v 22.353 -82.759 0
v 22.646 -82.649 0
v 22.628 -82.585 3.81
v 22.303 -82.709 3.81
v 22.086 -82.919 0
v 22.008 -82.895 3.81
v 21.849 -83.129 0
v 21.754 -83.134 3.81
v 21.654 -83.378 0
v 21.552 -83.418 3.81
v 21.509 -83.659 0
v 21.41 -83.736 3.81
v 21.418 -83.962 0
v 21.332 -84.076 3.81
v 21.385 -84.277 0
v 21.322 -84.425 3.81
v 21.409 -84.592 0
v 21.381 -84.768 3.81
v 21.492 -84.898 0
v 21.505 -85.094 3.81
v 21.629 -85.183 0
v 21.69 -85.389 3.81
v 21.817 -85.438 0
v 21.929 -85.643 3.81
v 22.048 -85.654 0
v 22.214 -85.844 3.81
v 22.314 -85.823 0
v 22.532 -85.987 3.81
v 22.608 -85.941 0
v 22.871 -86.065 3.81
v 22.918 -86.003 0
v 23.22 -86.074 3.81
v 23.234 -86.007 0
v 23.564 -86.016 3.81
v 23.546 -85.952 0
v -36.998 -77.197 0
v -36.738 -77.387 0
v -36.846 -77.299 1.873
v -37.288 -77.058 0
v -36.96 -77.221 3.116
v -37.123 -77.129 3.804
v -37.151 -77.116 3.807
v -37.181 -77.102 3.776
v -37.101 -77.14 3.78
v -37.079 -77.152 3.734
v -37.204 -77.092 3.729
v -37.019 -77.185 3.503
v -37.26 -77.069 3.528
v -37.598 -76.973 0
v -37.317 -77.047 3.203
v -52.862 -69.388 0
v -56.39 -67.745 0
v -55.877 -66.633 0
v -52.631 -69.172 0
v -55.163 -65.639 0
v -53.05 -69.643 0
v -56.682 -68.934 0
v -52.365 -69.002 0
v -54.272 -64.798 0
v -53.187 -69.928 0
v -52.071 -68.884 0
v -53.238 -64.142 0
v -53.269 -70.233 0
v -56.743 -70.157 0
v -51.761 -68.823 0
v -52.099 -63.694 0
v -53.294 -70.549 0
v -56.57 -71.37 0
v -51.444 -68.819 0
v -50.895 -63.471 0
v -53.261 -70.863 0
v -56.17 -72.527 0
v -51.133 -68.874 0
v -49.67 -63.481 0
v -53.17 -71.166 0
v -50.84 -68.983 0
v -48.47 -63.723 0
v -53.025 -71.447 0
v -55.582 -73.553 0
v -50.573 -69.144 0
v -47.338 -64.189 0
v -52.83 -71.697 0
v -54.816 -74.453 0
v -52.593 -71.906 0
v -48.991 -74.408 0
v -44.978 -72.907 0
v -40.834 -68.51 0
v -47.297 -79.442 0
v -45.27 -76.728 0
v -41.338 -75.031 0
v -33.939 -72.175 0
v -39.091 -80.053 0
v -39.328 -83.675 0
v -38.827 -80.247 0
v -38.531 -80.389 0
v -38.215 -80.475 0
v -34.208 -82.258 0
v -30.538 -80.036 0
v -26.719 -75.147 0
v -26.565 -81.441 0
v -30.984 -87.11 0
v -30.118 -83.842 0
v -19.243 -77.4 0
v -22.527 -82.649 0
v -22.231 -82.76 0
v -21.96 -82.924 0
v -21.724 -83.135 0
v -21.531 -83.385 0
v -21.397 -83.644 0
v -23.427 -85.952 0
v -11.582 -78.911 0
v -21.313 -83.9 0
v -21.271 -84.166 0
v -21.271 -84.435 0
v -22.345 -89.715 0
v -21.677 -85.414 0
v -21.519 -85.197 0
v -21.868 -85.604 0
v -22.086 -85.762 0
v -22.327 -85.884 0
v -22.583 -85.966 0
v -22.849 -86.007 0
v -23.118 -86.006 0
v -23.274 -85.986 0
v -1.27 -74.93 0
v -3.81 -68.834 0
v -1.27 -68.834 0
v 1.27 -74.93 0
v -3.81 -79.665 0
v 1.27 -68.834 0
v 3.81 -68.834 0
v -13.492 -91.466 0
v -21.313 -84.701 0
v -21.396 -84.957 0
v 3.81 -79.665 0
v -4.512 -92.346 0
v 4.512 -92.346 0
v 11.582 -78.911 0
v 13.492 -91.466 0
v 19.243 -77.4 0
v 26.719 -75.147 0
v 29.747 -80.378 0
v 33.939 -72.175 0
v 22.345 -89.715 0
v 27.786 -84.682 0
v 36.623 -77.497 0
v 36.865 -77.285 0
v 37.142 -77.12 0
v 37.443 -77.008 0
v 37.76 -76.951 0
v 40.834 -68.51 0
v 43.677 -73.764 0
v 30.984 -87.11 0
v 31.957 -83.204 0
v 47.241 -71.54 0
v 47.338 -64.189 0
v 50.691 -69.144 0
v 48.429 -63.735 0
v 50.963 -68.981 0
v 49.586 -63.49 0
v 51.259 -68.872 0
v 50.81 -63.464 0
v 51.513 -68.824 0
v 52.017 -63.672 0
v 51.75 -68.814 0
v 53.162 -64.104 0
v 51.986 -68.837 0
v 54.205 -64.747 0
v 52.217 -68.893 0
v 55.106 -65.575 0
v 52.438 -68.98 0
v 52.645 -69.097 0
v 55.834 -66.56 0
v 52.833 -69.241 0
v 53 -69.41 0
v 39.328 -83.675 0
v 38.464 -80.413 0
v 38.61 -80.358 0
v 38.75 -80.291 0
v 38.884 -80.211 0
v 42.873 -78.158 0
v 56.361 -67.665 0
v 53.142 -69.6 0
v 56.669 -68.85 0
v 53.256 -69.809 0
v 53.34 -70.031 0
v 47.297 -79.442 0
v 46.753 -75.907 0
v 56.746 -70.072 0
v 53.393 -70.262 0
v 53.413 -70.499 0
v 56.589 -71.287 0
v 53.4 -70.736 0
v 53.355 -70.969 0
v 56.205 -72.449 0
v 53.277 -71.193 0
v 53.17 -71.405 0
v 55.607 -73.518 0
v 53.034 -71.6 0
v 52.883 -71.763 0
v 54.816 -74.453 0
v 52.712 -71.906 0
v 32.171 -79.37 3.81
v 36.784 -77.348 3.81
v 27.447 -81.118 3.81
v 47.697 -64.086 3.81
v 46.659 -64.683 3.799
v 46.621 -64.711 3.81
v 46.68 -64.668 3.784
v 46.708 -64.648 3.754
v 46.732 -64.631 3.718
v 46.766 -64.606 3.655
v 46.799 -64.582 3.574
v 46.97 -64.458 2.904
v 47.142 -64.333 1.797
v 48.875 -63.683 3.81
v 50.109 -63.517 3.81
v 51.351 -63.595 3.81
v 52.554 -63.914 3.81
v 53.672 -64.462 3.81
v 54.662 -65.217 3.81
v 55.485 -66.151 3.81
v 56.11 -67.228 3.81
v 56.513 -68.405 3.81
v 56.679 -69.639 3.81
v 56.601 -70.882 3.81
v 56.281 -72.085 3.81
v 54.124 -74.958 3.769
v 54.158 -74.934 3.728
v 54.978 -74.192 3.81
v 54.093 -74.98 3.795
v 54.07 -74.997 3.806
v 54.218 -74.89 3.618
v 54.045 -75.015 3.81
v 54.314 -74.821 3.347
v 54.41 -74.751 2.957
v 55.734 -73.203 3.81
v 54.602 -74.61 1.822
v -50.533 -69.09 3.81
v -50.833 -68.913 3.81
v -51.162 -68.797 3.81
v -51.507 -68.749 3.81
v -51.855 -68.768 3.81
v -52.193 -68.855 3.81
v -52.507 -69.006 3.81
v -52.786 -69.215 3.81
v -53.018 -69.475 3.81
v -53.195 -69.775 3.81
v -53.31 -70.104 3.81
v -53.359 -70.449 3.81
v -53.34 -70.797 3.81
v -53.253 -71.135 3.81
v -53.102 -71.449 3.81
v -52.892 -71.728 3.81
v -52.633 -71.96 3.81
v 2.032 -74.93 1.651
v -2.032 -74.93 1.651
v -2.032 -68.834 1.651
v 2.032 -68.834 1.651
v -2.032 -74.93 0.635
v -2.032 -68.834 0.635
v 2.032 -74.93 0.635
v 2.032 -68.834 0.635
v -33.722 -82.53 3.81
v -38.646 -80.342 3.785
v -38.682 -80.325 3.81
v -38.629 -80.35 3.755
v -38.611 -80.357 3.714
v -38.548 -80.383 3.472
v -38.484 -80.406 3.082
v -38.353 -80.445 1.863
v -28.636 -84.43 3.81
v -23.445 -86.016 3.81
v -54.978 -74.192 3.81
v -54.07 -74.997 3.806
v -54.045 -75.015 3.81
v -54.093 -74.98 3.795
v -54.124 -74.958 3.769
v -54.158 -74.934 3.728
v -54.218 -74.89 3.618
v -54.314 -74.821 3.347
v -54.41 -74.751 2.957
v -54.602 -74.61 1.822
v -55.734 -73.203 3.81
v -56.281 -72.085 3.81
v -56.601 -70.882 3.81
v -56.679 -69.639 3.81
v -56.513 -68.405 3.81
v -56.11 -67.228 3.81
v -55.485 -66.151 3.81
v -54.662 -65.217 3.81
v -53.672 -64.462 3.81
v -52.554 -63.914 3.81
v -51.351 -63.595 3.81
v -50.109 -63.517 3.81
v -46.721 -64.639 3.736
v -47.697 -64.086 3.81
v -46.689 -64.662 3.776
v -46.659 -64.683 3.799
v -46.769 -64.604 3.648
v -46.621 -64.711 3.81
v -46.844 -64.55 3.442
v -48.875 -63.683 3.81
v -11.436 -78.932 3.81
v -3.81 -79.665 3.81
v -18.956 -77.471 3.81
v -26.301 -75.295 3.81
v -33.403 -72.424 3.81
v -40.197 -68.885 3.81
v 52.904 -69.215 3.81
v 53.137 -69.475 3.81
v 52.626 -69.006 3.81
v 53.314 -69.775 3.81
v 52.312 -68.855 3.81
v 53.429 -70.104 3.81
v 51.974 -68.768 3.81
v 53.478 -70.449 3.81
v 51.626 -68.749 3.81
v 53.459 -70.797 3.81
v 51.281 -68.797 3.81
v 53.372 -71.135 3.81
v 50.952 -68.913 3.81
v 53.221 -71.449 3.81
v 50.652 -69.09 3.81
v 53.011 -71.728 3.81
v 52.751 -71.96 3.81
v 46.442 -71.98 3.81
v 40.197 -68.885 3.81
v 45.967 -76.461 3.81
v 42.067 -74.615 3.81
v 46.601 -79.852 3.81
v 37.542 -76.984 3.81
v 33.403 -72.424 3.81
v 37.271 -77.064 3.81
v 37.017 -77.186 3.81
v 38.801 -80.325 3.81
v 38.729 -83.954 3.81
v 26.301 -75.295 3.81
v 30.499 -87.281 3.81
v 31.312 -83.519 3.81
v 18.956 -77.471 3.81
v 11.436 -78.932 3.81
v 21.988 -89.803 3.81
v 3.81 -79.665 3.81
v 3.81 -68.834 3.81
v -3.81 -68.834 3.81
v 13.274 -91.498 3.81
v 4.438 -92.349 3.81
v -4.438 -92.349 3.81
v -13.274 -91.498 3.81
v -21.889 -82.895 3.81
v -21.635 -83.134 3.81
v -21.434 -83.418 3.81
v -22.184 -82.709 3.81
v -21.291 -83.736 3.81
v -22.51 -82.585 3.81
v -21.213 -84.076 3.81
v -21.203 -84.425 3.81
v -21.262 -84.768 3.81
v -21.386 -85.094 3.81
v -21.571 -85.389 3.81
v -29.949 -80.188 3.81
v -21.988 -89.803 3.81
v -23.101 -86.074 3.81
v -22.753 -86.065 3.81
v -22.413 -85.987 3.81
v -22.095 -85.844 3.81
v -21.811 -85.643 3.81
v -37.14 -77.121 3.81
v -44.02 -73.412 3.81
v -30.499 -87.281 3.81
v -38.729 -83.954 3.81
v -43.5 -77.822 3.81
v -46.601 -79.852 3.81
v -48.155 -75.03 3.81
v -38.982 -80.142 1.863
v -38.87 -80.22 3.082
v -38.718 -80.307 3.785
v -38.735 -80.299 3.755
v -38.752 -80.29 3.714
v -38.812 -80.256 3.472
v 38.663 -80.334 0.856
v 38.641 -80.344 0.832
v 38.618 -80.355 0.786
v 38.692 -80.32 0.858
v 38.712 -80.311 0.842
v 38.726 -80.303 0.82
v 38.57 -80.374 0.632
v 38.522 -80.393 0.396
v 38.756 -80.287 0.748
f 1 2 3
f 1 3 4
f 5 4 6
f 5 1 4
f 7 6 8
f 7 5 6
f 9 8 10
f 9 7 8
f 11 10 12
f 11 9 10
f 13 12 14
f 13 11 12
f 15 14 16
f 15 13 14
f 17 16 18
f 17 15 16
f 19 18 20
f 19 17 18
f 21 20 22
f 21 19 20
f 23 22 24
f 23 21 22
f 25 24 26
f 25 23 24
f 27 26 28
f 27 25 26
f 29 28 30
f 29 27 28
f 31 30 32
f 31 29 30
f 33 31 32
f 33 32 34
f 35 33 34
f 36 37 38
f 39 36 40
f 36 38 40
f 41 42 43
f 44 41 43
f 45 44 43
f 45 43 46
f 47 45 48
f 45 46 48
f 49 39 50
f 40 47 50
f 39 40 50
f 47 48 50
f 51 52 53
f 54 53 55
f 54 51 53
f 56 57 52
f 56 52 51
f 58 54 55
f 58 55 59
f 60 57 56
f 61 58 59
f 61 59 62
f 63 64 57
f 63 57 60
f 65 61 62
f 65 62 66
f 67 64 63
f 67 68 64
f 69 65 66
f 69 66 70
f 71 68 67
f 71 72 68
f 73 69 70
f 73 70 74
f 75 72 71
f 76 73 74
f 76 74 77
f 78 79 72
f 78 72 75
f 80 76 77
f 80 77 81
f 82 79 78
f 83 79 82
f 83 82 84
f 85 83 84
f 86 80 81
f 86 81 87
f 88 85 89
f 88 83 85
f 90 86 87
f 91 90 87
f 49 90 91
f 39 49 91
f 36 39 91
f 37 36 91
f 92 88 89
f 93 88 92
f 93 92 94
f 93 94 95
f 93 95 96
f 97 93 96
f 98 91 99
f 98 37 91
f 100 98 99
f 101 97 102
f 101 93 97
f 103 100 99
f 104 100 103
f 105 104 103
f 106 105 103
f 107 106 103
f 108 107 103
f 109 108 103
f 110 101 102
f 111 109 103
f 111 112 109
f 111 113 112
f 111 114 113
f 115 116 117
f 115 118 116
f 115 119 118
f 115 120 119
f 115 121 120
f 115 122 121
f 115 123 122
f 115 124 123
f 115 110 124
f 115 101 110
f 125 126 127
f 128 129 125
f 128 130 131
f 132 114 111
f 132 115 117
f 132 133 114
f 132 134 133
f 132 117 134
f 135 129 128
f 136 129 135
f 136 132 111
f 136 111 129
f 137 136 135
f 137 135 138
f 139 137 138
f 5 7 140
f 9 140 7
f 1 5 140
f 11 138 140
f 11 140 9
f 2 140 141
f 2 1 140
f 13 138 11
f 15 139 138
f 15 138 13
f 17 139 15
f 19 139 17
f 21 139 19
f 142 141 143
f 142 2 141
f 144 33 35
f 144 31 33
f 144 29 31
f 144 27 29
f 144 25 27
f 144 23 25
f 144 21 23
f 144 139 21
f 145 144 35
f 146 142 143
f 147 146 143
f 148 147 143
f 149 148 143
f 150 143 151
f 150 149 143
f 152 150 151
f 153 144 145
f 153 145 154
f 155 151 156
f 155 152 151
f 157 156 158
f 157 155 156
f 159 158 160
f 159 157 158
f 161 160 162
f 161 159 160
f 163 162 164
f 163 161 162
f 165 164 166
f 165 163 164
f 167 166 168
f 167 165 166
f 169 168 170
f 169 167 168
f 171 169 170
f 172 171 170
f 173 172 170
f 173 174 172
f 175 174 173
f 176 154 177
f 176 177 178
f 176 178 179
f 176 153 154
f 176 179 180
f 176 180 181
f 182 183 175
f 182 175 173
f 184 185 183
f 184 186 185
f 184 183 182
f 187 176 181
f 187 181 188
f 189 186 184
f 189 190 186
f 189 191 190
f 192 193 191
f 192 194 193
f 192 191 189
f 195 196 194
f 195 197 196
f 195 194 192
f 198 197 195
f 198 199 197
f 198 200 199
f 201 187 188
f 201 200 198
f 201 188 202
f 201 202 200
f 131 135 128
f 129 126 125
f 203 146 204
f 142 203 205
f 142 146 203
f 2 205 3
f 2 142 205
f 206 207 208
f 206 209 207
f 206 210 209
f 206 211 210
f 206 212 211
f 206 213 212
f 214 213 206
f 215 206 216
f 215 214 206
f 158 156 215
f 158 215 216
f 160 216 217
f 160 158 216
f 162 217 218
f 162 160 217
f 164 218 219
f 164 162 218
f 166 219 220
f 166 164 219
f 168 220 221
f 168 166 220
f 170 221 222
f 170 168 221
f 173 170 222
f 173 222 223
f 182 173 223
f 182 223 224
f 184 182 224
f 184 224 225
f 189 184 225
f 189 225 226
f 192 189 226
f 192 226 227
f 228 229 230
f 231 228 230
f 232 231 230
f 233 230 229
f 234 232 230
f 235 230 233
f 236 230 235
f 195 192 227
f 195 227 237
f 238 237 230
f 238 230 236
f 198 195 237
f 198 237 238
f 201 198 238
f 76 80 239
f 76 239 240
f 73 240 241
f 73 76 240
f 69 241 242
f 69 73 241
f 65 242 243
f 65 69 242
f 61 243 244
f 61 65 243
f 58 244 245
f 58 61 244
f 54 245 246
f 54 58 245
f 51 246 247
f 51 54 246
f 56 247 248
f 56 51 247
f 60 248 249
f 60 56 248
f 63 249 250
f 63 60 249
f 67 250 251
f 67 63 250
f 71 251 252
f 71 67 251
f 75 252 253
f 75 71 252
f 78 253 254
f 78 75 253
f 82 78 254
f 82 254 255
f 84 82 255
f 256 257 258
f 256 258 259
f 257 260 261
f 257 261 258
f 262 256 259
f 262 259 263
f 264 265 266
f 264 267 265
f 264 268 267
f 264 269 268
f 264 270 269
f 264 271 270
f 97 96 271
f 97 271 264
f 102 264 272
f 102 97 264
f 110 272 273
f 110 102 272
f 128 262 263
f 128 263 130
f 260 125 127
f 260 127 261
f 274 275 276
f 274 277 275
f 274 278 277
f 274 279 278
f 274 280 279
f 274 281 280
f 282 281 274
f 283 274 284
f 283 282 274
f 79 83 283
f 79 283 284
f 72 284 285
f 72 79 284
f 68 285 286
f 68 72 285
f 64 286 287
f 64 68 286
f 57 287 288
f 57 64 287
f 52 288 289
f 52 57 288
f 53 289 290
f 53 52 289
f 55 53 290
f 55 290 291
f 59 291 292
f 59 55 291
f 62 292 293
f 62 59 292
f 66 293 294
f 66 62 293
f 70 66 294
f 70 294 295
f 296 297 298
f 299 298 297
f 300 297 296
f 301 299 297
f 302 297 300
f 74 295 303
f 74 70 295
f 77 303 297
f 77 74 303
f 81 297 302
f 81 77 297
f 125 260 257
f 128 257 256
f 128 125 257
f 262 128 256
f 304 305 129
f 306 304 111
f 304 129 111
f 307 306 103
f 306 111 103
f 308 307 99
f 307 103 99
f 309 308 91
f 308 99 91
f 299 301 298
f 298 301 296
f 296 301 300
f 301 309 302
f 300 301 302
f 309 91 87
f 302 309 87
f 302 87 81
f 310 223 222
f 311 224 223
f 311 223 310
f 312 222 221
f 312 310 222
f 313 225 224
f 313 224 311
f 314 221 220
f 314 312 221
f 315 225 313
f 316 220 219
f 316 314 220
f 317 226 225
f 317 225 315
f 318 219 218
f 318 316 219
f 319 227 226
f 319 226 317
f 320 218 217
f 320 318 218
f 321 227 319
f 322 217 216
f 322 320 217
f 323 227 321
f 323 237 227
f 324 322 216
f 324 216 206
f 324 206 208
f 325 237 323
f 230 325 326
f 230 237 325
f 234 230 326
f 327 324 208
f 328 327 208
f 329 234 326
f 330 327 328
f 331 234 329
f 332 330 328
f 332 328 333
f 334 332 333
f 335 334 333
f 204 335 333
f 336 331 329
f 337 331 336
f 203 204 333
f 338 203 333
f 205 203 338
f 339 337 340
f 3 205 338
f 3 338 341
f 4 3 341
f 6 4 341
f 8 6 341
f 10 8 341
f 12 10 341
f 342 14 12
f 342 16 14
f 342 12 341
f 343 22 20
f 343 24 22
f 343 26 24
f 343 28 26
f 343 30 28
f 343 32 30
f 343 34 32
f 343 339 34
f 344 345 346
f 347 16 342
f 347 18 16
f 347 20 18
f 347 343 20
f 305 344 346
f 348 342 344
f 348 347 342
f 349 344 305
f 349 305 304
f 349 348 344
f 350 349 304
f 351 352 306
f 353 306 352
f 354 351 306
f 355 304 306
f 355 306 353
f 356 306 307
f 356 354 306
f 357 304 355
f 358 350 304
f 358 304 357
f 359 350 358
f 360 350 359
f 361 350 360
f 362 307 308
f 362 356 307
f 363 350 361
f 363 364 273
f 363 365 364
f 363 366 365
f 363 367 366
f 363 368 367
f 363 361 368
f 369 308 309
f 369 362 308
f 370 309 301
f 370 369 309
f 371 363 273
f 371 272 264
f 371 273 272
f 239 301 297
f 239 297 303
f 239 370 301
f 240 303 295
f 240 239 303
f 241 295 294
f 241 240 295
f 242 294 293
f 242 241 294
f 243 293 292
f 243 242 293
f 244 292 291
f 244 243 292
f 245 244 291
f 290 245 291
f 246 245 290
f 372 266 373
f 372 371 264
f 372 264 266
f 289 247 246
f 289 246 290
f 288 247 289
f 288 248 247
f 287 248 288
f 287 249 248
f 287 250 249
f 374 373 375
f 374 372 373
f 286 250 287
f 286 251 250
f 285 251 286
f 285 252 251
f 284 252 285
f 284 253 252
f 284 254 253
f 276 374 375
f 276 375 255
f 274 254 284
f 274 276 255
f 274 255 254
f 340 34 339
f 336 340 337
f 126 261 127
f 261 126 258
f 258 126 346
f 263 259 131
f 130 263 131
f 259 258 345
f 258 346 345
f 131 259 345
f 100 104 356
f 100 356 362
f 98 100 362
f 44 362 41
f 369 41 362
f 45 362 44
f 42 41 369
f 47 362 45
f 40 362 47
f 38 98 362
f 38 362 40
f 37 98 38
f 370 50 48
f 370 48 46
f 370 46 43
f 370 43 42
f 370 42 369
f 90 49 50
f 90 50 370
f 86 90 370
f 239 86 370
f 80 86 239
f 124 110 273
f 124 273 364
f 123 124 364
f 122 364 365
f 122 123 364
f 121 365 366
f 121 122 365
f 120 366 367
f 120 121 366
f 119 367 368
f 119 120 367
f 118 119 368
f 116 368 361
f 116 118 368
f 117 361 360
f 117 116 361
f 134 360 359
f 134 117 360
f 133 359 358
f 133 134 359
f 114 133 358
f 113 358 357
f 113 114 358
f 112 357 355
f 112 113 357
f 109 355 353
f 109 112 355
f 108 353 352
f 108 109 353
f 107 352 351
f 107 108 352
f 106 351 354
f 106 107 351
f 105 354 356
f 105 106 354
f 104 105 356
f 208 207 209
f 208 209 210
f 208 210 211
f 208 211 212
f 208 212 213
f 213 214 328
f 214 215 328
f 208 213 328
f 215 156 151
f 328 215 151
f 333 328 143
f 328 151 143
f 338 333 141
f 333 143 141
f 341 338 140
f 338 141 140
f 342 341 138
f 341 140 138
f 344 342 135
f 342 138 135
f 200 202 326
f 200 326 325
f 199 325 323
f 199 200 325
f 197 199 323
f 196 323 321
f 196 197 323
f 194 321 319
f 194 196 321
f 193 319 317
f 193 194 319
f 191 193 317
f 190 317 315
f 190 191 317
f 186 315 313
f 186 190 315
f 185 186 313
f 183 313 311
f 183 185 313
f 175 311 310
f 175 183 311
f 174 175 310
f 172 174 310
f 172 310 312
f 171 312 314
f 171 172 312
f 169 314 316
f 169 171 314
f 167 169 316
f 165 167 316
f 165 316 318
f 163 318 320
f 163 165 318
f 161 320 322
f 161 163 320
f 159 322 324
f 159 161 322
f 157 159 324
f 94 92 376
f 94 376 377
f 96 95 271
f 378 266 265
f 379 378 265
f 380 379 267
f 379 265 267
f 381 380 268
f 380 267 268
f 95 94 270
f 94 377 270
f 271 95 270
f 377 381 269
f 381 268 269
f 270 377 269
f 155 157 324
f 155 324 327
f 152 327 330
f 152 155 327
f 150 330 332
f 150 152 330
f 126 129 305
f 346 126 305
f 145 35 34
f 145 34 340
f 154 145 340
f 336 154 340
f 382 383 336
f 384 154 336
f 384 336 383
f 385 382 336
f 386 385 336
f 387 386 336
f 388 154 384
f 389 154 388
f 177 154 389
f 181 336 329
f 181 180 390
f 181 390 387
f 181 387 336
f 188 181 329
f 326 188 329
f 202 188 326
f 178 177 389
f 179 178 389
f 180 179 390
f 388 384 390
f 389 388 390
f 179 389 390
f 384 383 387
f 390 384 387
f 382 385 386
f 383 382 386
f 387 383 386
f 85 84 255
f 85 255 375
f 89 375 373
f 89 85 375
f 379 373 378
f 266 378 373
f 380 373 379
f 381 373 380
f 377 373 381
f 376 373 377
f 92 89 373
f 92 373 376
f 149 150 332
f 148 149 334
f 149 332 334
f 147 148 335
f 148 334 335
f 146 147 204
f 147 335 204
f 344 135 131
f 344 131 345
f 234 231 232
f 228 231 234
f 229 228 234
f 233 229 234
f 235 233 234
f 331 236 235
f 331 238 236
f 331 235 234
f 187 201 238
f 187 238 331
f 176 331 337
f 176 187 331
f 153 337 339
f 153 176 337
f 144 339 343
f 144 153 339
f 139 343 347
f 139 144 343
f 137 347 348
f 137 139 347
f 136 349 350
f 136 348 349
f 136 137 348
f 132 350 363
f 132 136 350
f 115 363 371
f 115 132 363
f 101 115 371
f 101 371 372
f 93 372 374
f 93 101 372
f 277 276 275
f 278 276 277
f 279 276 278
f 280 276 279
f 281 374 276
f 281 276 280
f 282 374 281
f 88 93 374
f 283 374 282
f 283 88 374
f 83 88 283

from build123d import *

# Parameters (mm, degrees)
SKETCH1_W           = 3.81
SKETCH1_H           = 12.7
SKETCH2_R           = 1.778
CUT_EXTRUDE1_DEPTH  = 4.81
SKETCH3_OUTSIDE_W   = 239.386
SKETCH3_OUTSIDE_H   = 239.386
CUT_EXTRUDE15_DEPTH = 4.81
CUT_EXTRUDE15_TAPER = 1
SKETCH8_W           = 7.62
SKETCH8_H           = 3.81
BOSS_EXTRUDE1_DEPTH = 10.922
CUT_EXTRUDE16_DEPTH = 6.096


with BuildPart() as part:
    # Sketch1 → Revolve1 (revolve)
    with BuildSketch(Plane(origin=(0, 0, 0), x_dir=(0, 0, -1), z_dir=(1, 0, 0)), mode=Mode.PRIVATE) as revolve1_sk:
        with Locations((-1.905, 86.106)):
            Rectangle(SKETCH1_W, SKETCH1_H)
    revolve(revolve1_sk.sketch.rotate(Axis((0, 0, 0), (0, 0, -1)), 90), axis=Axis((0, 0, 0), (0, 0, -1)))  # turned: the seam where the file's is

    # Sketch2 → Cut-Extrude1 (cut, through all)
    with BuildSketch(Plane.XY.offset(3.81)):
        with Locations((0, 87.376)):
            Circle(SKETCH2_R)
        with Locations((68.313308, 54.478045)):
            Circle(SKETCH2_R)
        with Locations((85.185301, -19.442989)):
            Circle(SKETCH2_R)
        with Locations((37.911026, -78.723056)):
            Circle(SKETCH2_R)
        with Locations((-37.911026, -78.723056)):
            Circle(SKETCH2_R)
        with Locations((-85.185301, -19.442989)):
            Circle(SKETCH2_R)
        with Locations((-68.313308, 54.478045)):
            Circle(SKETCH2_R)
    extrude(amount=-CUT_EXTRUDE1_DEPTH, mode=Mode.SUBTRACT)

    # Sketch3 outside → Cut-Extrude15 (cut, through all)
    with BuildSketch(Plane.XY.offset(3.81)):
        Rectangle(SKETCH3_OUTSIDE_W, SKETCH3_OUTSIDE_H)
        with BuildLine():
            ThreePointArc((-46.620921, -64.710967), (-55.484924, -66.151258), (-54.044634, -75.015262))
            ThreePointArc((-54.044634, -75.015262), (0, -92.456), (54.044634, -75.015262))
            ThreePointArc((54.044634, -75.015262), (55.484924, -66.151258), (46.620921, -64.710967))
            ThreePointArc((46.620921, -64.710967), (0, -79.756), (-46.620921, -64.710967))
        make_face(mode=Mode.SUBTRACT)
        with BuildLine():
            ThreePointArc((-52.63259, -71.960032), (-38.682471, -80.324978), (-23.444735, -86.016162))
            ThreePointArc((-23.444735, -86.016162), (-21.261754, -84.768299), (-22.509617, -82.585318))
            ThreePointArc((-22.509617, -82.585318), (-37.13958, -77.121133), (-50.533285, -69.089831))
            ThreePointArc((-50.533285, -69.089831), (-53.018038, -69.475278), (-52.63259, -71.960032))
        make_face()
        with BuildLine():
            ThreePointArc((23.563518, -86.016162), (38.801254, -80.324978), (52.751374, -71.960032))
            ThreePointArc((52.751374, -71.960032), (53.136821, -69.475278), (50.652068, -69.089831))
            ThreePointArc((50.652068, -69.089831), (37.258363, -77.121133), (22.6284, -82.585318))
            ThreePointArc((22.6284, -82.585318), (21.380537, -84.768299), (23.563518, -86.016162))
        make_face()
    extrude(amount=-CUT_EXTRUDE15_DEPTH, taper=CUT_EXTRUDE15_TAPER, mode=Mode.SUBTRACT)

    # Sketch8 → Boss-Extrude1 (add)
    with BuildSketch(Plane.XZ.offset(79.756)):
        with Locations((0, 1.905)):
            Rectangle(SKETCH8_W, SKETCH8_H)
    extrude(amount=-BOSS_EXTRUDE1_DEPTH)

    # Sketch9 → Cut-Extrude16 (cut)
    with BuildSketch(Plane(origin=(0, -68.834, 0), x_dir=(1, 0, 0), z_dir=(0, 1, 0))):
        Polygon((1.27, 0), (-1.27, 0), (-2.032, -0.635), (-2.032, -1.651), (2.032, -1.651), (2.032, -0.635), align=None)
    extrude(amount=-CUT_EXTRUDE16_DEPTH, mode=Mode.SUBTRACT)


solid = part.part
